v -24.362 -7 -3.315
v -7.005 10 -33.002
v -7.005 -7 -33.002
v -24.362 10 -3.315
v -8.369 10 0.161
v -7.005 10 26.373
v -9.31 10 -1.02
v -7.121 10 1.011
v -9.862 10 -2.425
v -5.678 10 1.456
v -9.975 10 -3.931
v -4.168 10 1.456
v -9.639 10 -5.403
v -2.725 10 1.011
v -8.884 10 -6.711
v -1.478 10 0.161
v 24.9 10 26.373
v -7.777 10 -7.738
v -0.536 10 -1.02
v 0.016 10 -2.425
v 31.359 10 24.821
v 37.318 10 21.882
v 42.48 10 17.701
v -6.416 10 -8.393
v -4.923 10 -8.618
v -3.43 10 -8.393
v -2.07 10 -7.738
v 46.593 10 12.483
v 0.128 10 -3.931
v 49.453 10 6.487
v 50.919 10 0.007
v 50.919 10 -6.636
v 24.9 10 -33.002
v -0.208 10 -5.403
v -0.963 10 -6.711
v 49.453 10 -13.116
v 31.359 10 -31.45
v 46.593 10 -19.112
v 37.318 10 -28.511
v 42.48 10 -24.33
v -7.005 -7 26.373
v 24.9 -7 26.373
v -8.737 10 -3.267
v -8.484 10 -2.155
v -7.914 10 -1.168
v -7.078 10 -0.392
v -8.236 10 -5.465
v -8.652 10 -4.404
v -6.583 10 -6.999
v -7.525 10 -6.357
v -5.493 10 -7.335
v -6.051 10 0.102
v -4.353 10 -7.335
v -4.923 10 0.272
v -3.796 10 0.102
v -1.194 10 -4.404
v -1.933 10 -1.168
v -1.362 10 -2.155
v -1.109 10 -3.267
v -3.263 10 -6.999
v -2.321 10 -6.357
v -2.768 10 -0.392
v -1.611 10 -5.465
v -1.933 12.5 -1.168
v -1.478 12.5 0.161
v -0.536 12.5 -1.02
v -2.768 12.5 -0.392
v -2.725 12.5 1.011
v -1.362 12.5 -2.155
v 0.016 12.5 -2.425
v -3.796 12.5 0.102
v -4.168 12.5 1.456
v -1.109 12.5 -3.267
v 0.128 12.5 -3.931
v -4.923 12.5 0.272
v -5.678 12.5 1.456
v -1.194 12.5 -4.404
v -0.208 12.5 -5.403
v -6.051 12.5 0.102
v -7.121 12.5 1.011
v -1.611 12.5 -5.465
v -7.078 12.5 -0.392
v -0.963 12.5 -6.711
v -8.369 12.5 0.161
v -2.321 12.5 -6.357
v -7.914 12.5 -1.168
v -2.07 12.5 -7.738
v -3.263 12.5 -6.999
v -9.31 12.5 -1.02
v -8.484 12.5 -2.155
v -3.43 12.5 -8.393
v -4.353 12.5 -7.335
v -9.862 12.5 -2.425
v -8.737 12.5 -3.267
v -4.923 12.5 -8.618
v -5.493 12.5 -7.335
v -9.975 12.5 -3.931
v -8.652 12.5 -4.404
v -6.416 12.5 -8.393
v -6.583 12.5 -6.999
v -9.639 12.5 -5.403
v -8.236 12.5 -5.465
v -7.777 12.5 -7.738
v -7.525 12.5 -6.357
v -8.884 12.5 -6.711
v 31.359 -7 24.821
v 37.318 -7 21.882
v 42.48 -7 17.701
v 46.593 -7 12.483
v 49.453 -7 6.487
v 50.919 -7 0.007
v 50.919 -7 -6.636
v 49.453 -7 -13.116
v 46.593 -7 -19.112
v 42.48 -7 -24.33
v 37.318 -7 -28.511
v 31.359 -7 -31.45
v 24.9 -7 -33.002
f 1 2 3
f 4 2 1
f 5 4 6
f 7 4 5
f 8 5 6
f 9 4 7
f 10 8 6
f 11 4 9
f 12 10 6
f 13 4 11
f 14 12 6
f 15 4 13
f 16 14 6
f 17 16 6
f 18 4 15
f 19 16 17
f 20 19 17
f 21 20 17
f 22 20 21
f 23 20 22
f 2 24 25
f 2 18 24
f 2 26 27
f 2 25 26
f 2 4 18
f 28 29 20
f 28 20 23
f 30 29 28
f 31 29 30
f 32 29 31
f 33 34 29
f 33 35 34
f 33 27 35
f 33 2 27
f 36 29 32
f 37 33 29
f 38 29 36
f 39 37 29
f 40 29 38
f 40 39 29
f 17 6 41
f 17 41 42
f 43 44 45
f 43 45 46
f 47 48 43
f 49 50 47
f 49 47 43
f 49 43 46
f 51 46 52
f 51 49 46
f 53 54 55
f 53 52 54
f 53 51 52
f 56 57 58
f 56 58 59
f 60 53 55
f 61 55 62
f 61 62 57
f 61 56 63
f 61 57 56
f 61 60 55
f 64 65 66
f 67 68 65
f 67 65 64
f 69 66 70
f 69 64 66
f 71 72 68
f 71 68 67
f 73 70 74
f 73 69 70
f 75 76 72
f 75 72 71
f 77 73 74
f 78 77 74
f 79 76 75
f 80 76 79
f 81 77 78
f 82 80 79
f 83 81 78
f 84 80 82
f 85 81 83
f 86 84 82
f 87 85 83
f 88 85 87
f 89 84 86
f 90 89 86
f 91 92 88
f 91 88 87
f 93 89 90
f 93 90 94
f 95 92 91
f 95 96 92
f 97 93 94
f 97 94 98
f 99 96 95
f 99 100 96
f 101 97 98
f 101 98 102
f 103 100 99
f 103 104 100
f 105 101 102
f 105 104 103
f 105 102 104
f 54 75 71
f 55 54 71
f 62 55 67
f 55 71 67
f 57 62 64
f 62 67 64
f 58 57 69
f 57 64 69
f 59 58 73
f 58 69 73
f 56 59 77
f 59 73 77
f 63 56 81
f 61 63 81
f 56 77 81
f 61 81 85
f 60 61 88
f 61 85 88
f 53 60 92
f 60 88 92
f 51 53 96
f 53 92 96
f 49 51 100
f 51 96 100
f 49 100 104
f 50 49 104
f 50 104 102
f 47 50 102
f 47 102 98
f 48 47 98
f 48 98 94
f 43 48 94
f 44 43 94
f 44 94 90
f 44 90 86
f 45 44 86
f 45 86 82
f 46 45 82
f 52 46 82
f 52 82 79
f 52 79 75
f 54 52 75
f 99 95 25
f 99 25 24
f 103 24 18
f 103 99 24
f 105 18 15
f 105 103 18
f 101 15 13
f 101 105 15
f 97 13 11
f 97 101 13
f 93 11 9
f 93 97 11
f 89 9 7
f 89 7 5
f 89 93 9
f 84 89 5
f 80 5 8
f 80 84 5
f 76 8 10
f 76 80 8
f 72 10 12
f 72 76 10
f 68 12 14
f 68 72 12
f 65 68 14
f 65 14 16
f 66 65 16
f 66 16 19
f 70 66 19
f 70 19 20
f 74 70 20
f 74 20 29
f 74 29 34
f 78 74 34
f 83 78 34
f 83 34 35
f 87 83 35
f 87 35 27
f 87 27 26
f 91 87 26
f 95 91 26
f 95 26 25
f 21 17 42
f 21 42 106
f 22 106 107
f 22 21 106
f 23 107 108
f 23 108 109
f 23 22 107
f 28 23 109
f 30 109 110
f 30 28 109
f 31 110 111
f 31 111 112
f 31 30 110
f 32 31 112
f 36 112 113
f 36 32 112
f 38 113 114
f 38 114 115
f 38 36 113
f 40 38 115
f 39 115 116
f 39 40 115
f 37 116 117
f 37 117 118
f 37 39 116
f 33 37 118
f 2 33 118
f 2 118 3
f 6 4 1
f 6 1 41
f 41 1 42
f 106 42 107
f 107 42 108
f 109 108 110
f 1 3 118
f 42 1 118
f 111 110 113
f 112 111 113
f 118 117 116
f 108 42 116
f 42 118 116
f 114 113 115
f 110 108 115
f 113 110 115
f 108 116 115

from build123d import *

# Parameters (mm, degrees)
SKETCH2_W            = 49
SKETCH2_H            = 20
BOSS_EXTRUDE1_DEPTH  = 10
SKETCH3_W            = 30
SKETCH3_H            = 3.02
CUT_EXTRUDE1_DEPTH   = 2
SKETCH4_W            = 5
SKETCH4_H            = 6
CUT_EXTRUDE2_DEPTH   = 5
SKETCH5_R            = 7
CUT_EXTRUDE3_DEPTH   = 38.474986727
SKETCH12_W           = 5
SKETCH12_H           = 6
BOSS_EXTRUDE4_DEPTH  = 0.8
SKETCH14_W           = 29.5
SKETCH14_H           = 6
CUT_EXTRUDE6_DEPTH   = 42.177221974
SKETCH20_W           = 5
SKETCH20_H           = 6
BOSS_EXTRUDE6_DEPTH  = 4.2
SKETCH21_R           = 4.6
CUT_EXTRUDE8_DEPTH   = 0.5
SKETCH22_R           = 3.825
CUT_EXTRUDE9_DEPTH   = 4
SKETCH24_R           = 4.6
SKETCH24_R_2         = 4.25
CUT_EXTRUDE11_DEPTH  = 1
BOSS_EXTRUDE9_START  = 8
SKETCH26_R           = 5.065639608
SKETCH26_R_2         = 3.825
BOSS_EXTRUDE9_DEPTH  = 8
SKETCH27_R           = 7
SKETCH27_R_2         = 4.6
CUT_EXTRUDE12_DEPTH  = 1
FILLET1_R            = 0.5
SKETCH56_R           = 2
CUT_EXTRUDE13_DEPTH  = 2
SKETCH57_W           = 3
SKETCH57_H           = 6
BOSS_EXTRUDE19_DEPTH = 5.3
CUT_EXTRUDE14_REACH  = 50.729
SKETCH58_R           = 1.5
FILLET2_R            = 0.3
FILLET3_R            = 0.8
SKETCH60_W           = 19
SKETCH60_H           = 4
BOSS_EXTRUDE21_DEPTH = 1
SKETCH59_W           = 22.86
SKETCH59_H           = 13
BOSS_EXTRUDE20_DEPTH = 11
CUT_EXTRUDE15_REACH  = 49.914
SKETCH61_R           = 2.5
FILLET4_R            = 4
BOSS_EXTRUDE22_DEPTH = 17


with BuildPart() as part:
    # Sketch2 → Boss-Extrude1 (new body)
    with BuildSketch(Plane(origin=(0, 0, 0), x_dir=(1, 0, 0), z_dir=(0, 1, 0))):
        with Locations((10.076923077, 3.557692308)):
            Rectangle(SKETCH2_W, SKETCH2_H)
    extrude(amount=BOSS_EXTRUDE1_DEPTH)

    # Sketch3 → Cut-Extrude1 (cut)
    with BuildSketch(Plane.XZ):
        with Locations((12.576923077, -3.557692308)):
            Rectangle(SKETCH3_W, SKETCH3_H)
    extrude(amount=-CUT_EXTRUDE1_DEPTH, mode=Mode.SUBTRACT)

    # Sketch4 → Cut-Extrude2 (cut)
    with BuildSketch(Plane.XZ):
        with Locations((-4.923076923, -3.547692308)):
            Rectangle(SKETCH4_W, SKETCH4_H)
    extrude(amount=-CUT_EXTRUDE2_DEPTH, mode=Mode.SUBTRACT)

    # Sketch5 → Cut-Extrude3 (cut, through all)
    with BuildSketch(Plane.XZ.offset(-5)):
        with Locations(Location((-4.923076923, -3.552692308, 0), (0, 0, 270))):
            Circle(SKETCH5_R)
    extrude(amount=-CUT_EXTRUDE3_DEPTH, mode=Mode.SUBTRACT)

    # Sketch12 → Boss-Extrude4 (add)
    with BuildSketch(Plane.XZ):
        with Locations((-4.923076923, -3.547692308)):
            Rectangle(SKETCH12_W, SKETCH12_H)
    extrude(amount=-BOSS_EXTRUDE4_DEPTH)

    # Sketch14 → Cut-Extrude6 (cut, through all)
    with BuildSketch(Plane.XY.offset(6.442307692)):
        with Locations((19.826923077, 7)):
            Rectangle(SKETCH14_W, SKETCH14_H)
    extrude(amount=-CUT_EXTRUDE6_DEPTH, mode=Mode.SUBTRACT)

    # Sketch20 → Boss-Extrude6 (add)
    with BuildSketch(Plane(origin=(0, 0.8, 0), x_dir=(1, 0, 0), z_dir=(0, 1, 0))):
        with Locations((-4.923076923, 3.547692308)):
            Rectangle(SKETCH20_W, SKETCH20_H)
    extrude(amount=BOSS_EXTRUDE6_DEPTH)

    # Sketch21 → Cut-Extrude8 (cut)
    with BuildSketch(Plane(origin=(0, 5, 0), x_dir=(1, 0, 0), z_dir=(0, 1, 0))):
        with Locations(Location((-4.923076923, 3.552692308, 0), (0, 0, 270))):
            Circle(SKETCH21_R)
    extrude(amount=-CUT_EXTRUDE8_DEPTH, mode=Mode.SUBTRACT)

    # Sketch22 → Cut-Extrude9 (cut)
    with BuildSketch(Plane(origin=(0, 4.5, 0), x_dir=(1, 0, 0), z_dir=(0, 1, 0))):
        with Locations(Location((-4.923076923, 3.552692308, 0), (0, 0, 270))):
            Circle(SKETCH22_R)
    extrude(amount=-CUT_EXTRUDE9_DEPTH, mode=Mode.SUBTRACT)

    # Sketch24 → Cut-Extrude11 (cut)
    with BuildSketch(Plane(origin=(0, 5, 0), x_dir=(1, 0, 0), z_dir=(0, 1, 0))):
        with Locations(Location((-4.923076923, 3.552692308, 0), (0, 0, 270))):
            Circle(SKETCH24_R)
        with Locations(Location((-4.923076923, 3.552692308, 0), (0, 0, 270))):
            Circle(SKETCH24_R_2, mode=Mode.SUBTRACT)
    extrude(amount=-CUT_EXTRUDE11_DEPTH, mode=Mode.SUBTRACT)

    # Sketch26 → Boss-Extrude9 (add)
    with BuildSketch(Plane(origin=(0, 4.5, 0), x_dir=(1, 0, 0), z_dir=(0, 1, 0)).offset(BOSS_EXTRUDE9_START)):
        with Locations(Location((-4.923076923, 3.552692308, 0), (0, 0, 90))):
            Circle(SKETCH26_R)
        with Locations(Location((-4.923076923, 3.552692308, 0), (0, 0, 270))):
            Circle(SKETCH26_R_2, mode=Mode.SUBTRACT)
    extrude(amount=-BOSS_EXTRUDE9_DEPTH)

    # Sketch27 → Cut-Extrude12 (cut)
    with BuildSketch(Plane(origin=(0, 5, 0), x_dir=(1, 0, 0), z_dir=(0, 1, 0))):
        with Locations(Location((-4.923076923, 3.552692308, 0), (0, 0, 90))):
            Circle(SKETCH27_R)
        with Locations(Location((-4.923076923, 3.552692308, 0), (0, 0, 270))):
            Circle(SKETCH27_R_2, mode=Mode.SUBTRACT)
    extrude(amount=-CUT_EXTRUDE12_DEPTH, mode=Mode.SUBTRACT)

    # Fillet1
    fillet1_edges = [part.edges().sort_by_distance(p)[0] for p in [
        (5.076923077, 4, -3.557692308),
    ]]
    fillet(fillet1_edges, radius=FILLET1_R)

    # Sketch56 → Cut-Extrude13 (cut)
    with BuildSketch(Plane.XZ):
        with Locations((28.926923077, -3.557692308)):
            Circle(SKETCH56_R)
    extrude(amount=-CUT_EXTRUDE13_DEPTH, mode=Mode.SUBTRACT)

    # Sketch57 → Boss-Extrude19 (add)
    with BuildSketch(Plane(origin=(0, 4, 0), x_dir=(1, 0, 0), z_dir=(0, 1, 0))):
        with Locations((29.181923077, 3.557692308)):
            Rectangle(SKETCH57_W, SKETCH57_H)
        with Locations((22.931923077, 3.557692308)):
            Rectangle(SKETCH57_W, SKETCH57_H)
    extrude(amount=BOSS_EXTRUDE19_DEPTH)

    # Cut-Extrude14: up to this face of the body (flat: up to its plane)
    cut_extrude14_end = Plane(part.part.faces().sort_by_distance((21.431923077, 6.65, -3.557692308))[0])
    # Sketch58 → Cut-Extrude14 (cut, up to the picked face)
    with BuildSketch(Plane(origin=(30.681923077, 0, 0), x_dir=(0, 0, -1), z_dir=(1, 0, 0)), mode=Mode.PRIVATE) as cut_extrude14_sk1:
        with Locations(Location((3.557692308, 7, 0), (0, 0, 180))):
            Circle(SKETCH58_R)
    cut_extrude14_tool1 = split(extrude(cut_extrude14_sk1.sketch, amount=-CUT_EXTRUDE14_REACH, mode=Mode.PRIVATE), bisect_by=cut_extrude14_end, keep=Keep.BOTH, mode=Mode.PRIVATE)
    add(cut_extrude14_tool1.solids().sort_by(Axis((30.681923, 7, -3.557692), (-1, 0, 0)))[0], mode=Mode.SUBTRACT)

    # Fillet2
    fillet2_edges = [part.edges().sort_by_distance(p)[0] for p in [
        (27.681923077, 9.3, -3.557692308),
        (24.431923077, 9.3, -3.557692308),
    ]]
    fillet(fillet2_edges, radius=FILLET2_R)

    # Fillet3
    fillet3_edges = [part.edges().sort_by_distance(p)[0] for p in [
        (30.681923077, 4, -3.557692308),
        (30.681923077, 6.65, -0.557692308),
        (29.181923077, 4, -6.557692308),
        (30.681923077, 6.65, -6.557692308),
        (29.181923077, 4, -0.557692308),
        (21.431923077, 6.65, -6.557692308),
        (21.431923077, 6.65, -0.557692308),
        (22.931923077, 4, -6.557692308),
        (21.431923077, 4, -3.557692308),
        (22.931923077, 4, -0.557692308),
    ]]
    fillet(fillet3_edges, radius=FILLET3_R)

    # Sketch60 → Boss-Extrude21 (add)
    with BuildSketch(Plane(origin=(0, 0, -13.557692308), x_dir=(-1, 0, 0), z_dir=(0, 0, -1))):
        with Locations((-25.076923077, 2)):
            Rectangle(SKETCH60_W, SKETCH60_H)
    boss_extrude21 = extrude(amount=BOSS_EXTRUDE21_DEPTH)

    # Sketch59 → Boss-Extrude20 (add)
    with BuildSketch(Plane(origin=(0, 0, -14.557692308), x_dir=(-1, 0, 0), z_dir=(0, 0, -1))):
        with Locations((-26.956923077, 3.5)):
            Rectangle(SKETCH59_W, SKETCH59_H)
    boss_extrude20 = extrude(amount=BOSS_EXTRUDE20_DEPTH)

    # Mirror4: Boss-Extrude21, Boss-Extrude20 across plane
    add(boss_extrude21.mirror(Plane(origin=(0, 0, -3.557692308), x_dir=(1, 0, 0), z_dir=(0, 0, -1))))
    add(boss_extrude20.mirror(Plane(origin=(0, 0, -3.557692308), x_dir=(1, 0, 0), z_dir=(0, 0, -1))))

    # Sketch61 → Cut-Extrude15 (cut, up to next)
    with BuildSketch(Plane(origin=(0, 10, 0), x_dir=(1, 0, 0), z_dir=(0, 1, 0)), mode=Mode.PRIVATE) as cut_extrude15_sk1:
        with Locations(Location((20.406923077, 20.207692308, 0), (0, 0, 270))):
            Circle(SKETCH61_R)
    cut_extrude15_tool1 = extrude(cut_extrude15_sk1.sketch, amount=-CUT_EXTRUDE15_REACH, mode=Mode.PRIVATE) & part.part
    # Sketch61 → Cut-Extrude15 (cut, up to next)
    with BuildSketch(Plane(origin=(0, 10, 0), x_dir=(1, 0, 0), z_dir=(0, 1, 0)), mode=Mode.PRIVATE) as cut_extrude15_sk2:
        with Locations(Location((31.706923077, 20.207692308, 0), (0, 0, 270))):
            Circle(SKETCH61_R)
    cut_extrude15_tool2 = extrude(cut_extrude15_sk2.sketch, amount=-CUT_EXTRUDE15_REACH, mode=Mode.PRIVATE) & part.part
    # Sketch61 → Cut-Extrude15 (cut, up to next)
    with BuildSketch(Plane(origin=(0, 10, 0), x_dir=(1, 0, 0), z_dir=(0, 1, 0)), mode=Mode.PRIVATE) as cut_extrude15_sk3:
        with Locations(Location((31.706923077, -13.092307692, 0), (0, 0, 90))):
            Circle(SKETCH61_R)
    cut_extrude15_tool3 = extrude(cut_extrude15_sk3.sketch, amount=-CUT_EXTRUDE15_REACH, mode=Mode.PRIVATE) & part.part
    # Sketch61 → Cut-Extrude15 (cut, up to next)
    with BuildSketch(Plane(origin=(0, 10, 0), x_dir=(1, 0, 0), z_dir=(0, 1, 0)), mode=Mode.PRIVATE) as cut_extrude15_sk4:
        with Locations(Location((20.406923077, -13.092307692, 0), (0, 0, 90))):
            Circle(SKETCH61_R)
    cut_extrude15_tool4 = extrude(cut_extrude15_sk4.sketch, amount=-CUT_EXTRUDE15_REACH, mode=Mode.PRIVATE) & part.part
    add(cut_extrude15_tool1.solids().sort_by_distance((20.406923, 10, -20.207692))[0], mode=Mode.SUBTRACT)
    add(cut_extrude15_tool2.solids().sort_by_distance((31.706923, 10, -20.207692))[0], mode=Mode.SUBTRACT)
    add(cut_extrude15_tool3.solids().sort_by_distance((31.706923, 10, 13.092308))[0], mode=Mode.SUBTRACT)
    add(cut_extrude15_tool4.solids().sort_by_distance((20.406923, 10, 13.092308))[0], mode=Mode.SUBTRACT)

    # Fillet4
    # the kernel refuses this fillet: 4 mm, written as the material it takes off along each edge
    with BuildSketch(Plane(origin=(38.386923077, 20, -25.557692308), x_dir=(0, 0, 1), z_dir=(0, -1, 0)), Plane(origin=(15.526923077, -13, -25.557692308), x_dir=(0, 0, 1), z_dir=(0, 1, 0)), Plane(origin=(15.526923077, -13, 18.442307692), x_dir=(1, 0, 0), z_dir=(0, 1, 0))) as fillet4_piece_1:
        with BuildLine():
            CenterArc((FILLET4_R, FILLET4_R), FILLET4_R, 180, 90)
            Line((0, FILLET4_R), (0, 0))
            Line((0, 0), (FILLET4_R, 0))
        make_face()
    extrude(amount=33, mode=Mode.SUBTRACT)
    with BuildSketch(Plane(origin=(38.386923077, 20, -14.557692308), x_dir=(-1, 0, 0), z_dir=(0, -1, 0))) as fillet4_piece_2_section:
        with BuildLine():
            CenterArc((FILLET4_R, FILLET4_R), FILLET4_R, 180, 90)
            Line((0, FILLET4_R), (0, 0))
            Line((0, 0), (FILLET4_R, 0))
        make_face()
    fillet4_piece_2 = extrude(amount=33, mode=Mode.PRIVATE)
    fillet4_piece_2 = split(fillet4_piece_2, bisect_by=Plane(origin=(34.576923077, 12, -14.51845576), z_dir=(-1, 0, 0)), keep=Keep.TOP, mode=Mode.PRIVATE)
    fillet4_piece_2 = split(fillet4_piece_2, bisect_by=Plane(origin=(34.482800084, 4, -14.51845576), z_dir=(0, 1, 0)), keep=Keep.TOP, mode=Mode.PRIVATE)
    add(fillet4_piece_2, mode=Mode.SUBTRACT)
    with BuildSketch(Plane(origin=(38.386923077, 20, -14.557692308), x_dir=(-1, 0, 0), z_dir=(0, -1, 0))) as fillet4_piece_3_section:
        with BuildLine():
            CenterArc((FILLET4_R, FILLET4_R), FILLET4_R, 180, 90)
            Line((0, FILLET4_R), (0, 0))
            Line((0, 0), (FILLET4_R, 0))
        make_face()
    fillet4_piece_3 = extrude(amount=33, mode=Mode.PRIVATE)
    fillet4_piece_3 = split(fillet4_piece_3, bisect_by=Plane(origin=(34.576923077, 12, -15.466872512), z_dir=(1, 0, 0)), keep=Keep.TOP, mode=Mode.PRIVATE)
    fillet4_piece_3 = split(fillet4_piece_3, bisect_by=Plane(origin=(37.49276705, 4, -15.466872512), z_dir=(0, 1, 0)), keep=Keep.TOP, mode=Mode.PRIVATE)
    add(fillet4_piece_3, mode=Mode.SUBTRACT)
    with BuildSketch(Plane(origin=(38.386923077, 20, -14.557692308), x_dir=(-1, 0, 0), z_dir=(0, -1, 0))) as fillet4_piece_4_section:
        with BuildLine():
            CenterArc((FILLET4_R, FILLET4_R), FILLET4_R, 180, 90)
            Line((0, FILLET4_R), (0, 0))
            Line((0, 0), (FILLET4_R, 0))
        make_face()
    fillet4_piece_4 = extrude(amount=33, mode=Mode.PRIVATE)
    fillet4_piece_4 = split(fillet4_piece_4, bisect_by=Plane(origin=(34.576923077, 2, -15.466872512), z_dir=(1, 0, 0)), keep=Keep.TOP, mode=Mode.PRIVATE)
    fillet4_piece_4 = split(fillet4_piece_4, bisect_by=Plane(origin=(37.49276705, 0, -15.466872512), z_dir=(0, 1, 0)), keep=Keep.TOP, mode=Mode.PRIVATE)
    fillet4_piece_4 = split(fillet4_piece_4, bisect_by=Plane(origin=(37.49276705, 4, -15.466872512), z_dir=(0, -1, 0)), keep=Keep.TOP, mode=Mode.PRIVATE)
    add(fillet4_piece_4, mode=Mode.SUBTRACT)
    with BuildSketch(Plane(origin=(38.386923077, 20, -14.557692308), x_dir=(-1, 0, 0), z_dir=(0, -1, 0))) as fillet4_piece_5_section:
        with BuildLine():
            CenterArc((FILLET4_R, FILLET4_R), FILLET4_R, 180, 90)
            Line((0, FILLET4_R), (0, 0))
            Line((0, 0), (FILLET4_R, 0))
        make_face()
    fillet4_piece_5 = extrude(amount=33, mode=Mode.PRIVATE)
    fillet4_piece_5 = split(fillet4_piece_5, bisect_by=Plane(origin=(34.576923077, -6.5, -14.51845576), z_dir=(-1, 0, 0)), keep=Keep.TOP, mode=Mode.PRIVATE)
    fillet4_piece_5 = split(fillet4_piece_5, bisect_by=Plane(origin=(34.482800084, 0, -14.51845576), z_dir=(0, -1, 0)), keep=Keep.TOP, mode=Mode.PRIVATE)
    add(fillet4_piece_5, mode=Mode.SUBTRACT)
    with BuildSketch(Plane(origin=(38.386923077, 20, -14.557692308), x_dir=(-1, 0, 0), z_dir=(0, -1, 0))) as fillet4_piece_6_section:
        with BuildLine():
            CenterArc((FILLET4_R, FILLET4_R), FILLET4_R, 180, 90)
            Line((0, FILLET4_R), (0, 0))
            Line((0, 0), (FILLET4_R, 0))
        make_face()
    fillet4_piece_6 = extrude(amount=33, mode=Mode.PRIVATE)
    fillet4_piece_6 = split(fillet4_piece_6, bisect_by=Plane(origin=(34.576923077, -6.5, -15.466872512), z_dir=(1, 0, 0)), keep=Keep.TOP, mode=Mode.PRIVATE)
    fillet4_piece_6 = split(fillet4_piece_6, bisect_by=Plane(origin=(37.49276705, 0, -15.466872512), z_dir=(0, -1, 0)), keep=Keep.TOP, mode=Mode.PRIVATE)
    add(fillet4_piece_6, mode=Mode.SUBTRACT)
    with BuildSketch(Plane(origin=(38.386923077, 20, 7.442307692), x_dir=(0, 0, 1), z_dir=(0, -1, 0))) as fillet4_piece_7_section:
        with BuildLine():
            CenterArc((FILLET4_R, FILLET4_R), FILLET4_R, 180, 90)
            Line((0, FILLET4_R), (0, 0))
            Line((0, 0), (FILLET4_R, 0))
        make_face()
    fillet4_piece_7 = extrude(amount=33, mode=Mode.PRIVATE)
    fillet4_piece_7 = split(fillet4_piece_7, bisect_by=Plane(origin=(34.576923077, 12, 8.351487897), z_dir=(1, 0, 0)), keep=Keep.TOP, mode=Mode.PRIVATE)
    fillet4_piece_7 = split(fillet4_piece_7, bisect_by=Plane(origin=(37.49276705, 4, 8.351487897), z_dir=(0, 1, 0)), keep=Keep.TOP, mode=Mode.PRIVATE)
    add(fillet4_piece_7, mode=Mode.SUBTRACT)
    with BuildSketch(Plane(origin=(38.386923077, 20, 7.442307692), x_dir=(0, 0, 1), z_dir=(0, -1, 0))) as fillet4_piece_8_section:
        with BuildLine():
            CenterArc((FILLET4_R, FILLET4_R), FILLET4_R, 180, 90)
            Line((0, FILLET4_R), (0, 0))
            Line((0, 0), (FILLET4_R, 0))
        make_face()
    fillet4_piece_8 = extrude(amount=33, mode=Mode.PRIVATE)
    fillet4_piece_8 = split(fillet4_piece_8, bisect_by=Plane(origin=(34.576923077, 12, 7.403071145), z_dir=(-1, 0, 0)), keep=Keep.TOP, mode=Mode.PRIVATE)
    fillet4_piece_8 = split(fillet4_piece_8, bisect_by=Plane(origin=(34.482800084, 4, 7.403071145), z_dir=(0, 1, 0)), keep=Keep.TOP, mode=Mode.PRIVATE)
    add(fillet4_piece_8, mode=Mode.SUBTRACT)
    with BuildSketch(Plane(origin=(38.386923077, 20, 7.442307692), x_dir=(0, 0, 1), z_dir=(0, -1, 0))) as fillet4_piece_9_section:
        with BuildLine():
            CenterArc((FILLET4_R, FILLET4_R), FILLET4_R, 180, 90)
            Line((0, FILLET4_R), (0, 0))
            Line((0, 0), (FILLET4_R, 0))
        make_face()
    fillet4_piece_9 = extrude(amount=33, mode=Mode.PRIVATE)
    fillet4_piece_9 = split(fillet4_piece_9, bisect_by=Plane(origin=(34.576923077, 2, 8.351487897), z_dir=(1, 0, 0)), keep=Keep.TOP, mode=Mode.PRIVATE)
    fillet4_piece_9 = split(fillet4_piece_9, bisect_by=Plane(origin=(37.49276705, 0, 8.351487897), z_dir=(0, 1, 0)), keep=Keep.TOP, mode=Mode.PRIVATE)
    fillet4_piece_9 = split(fillet4_piece_9, bisect_by=Plane(origin=(37.49276705, 4, 8.351487897), z_dir=(0, -1, 0)), keep=Keep.TOP, mode=Mode.PRIVATE)
    add(fillet4_piece_9, mode=Mode.SUBTRACT)
    with BuildSketch(Plane(origin=(38.386923077, 20, 7.442307692), x_dir=(0, 0, 1), z_dir=(0, -1, 0))) as fillet4_piece_10_section:
        with BuildLine():
            CenterArc((FILLET4_R, FILLET4_R), FILLET4_R, 180, 90)
            Line((0, FILLET4_R), (0, 0))
            Line((0, 0), (FILLET4_R, 0))
        make_face()
    fillet4_piece_10 = extrude(amount=33, mode=Mode.PRIVATE)
    fillet4_piece_10 = split(fillet4_piece_10, bisect_by=Plane(origin=(34.576923077, -6.5, 8.351487897), z_dir=(1, 0, 0)), keep=Keep.TOP, mode=Mode.PRIVATE)
    fillet4_piece_10 = split(fillet4_piece_10, bisect_by=Plane(origin=(37.49276705, 0, 8.351487897), z_dir=(0, -1, 0)), keep=Keep.TOP, mode=Mode.PRIVATE)
    add(fillet4_piece_10, mode=Mode.SUBTRACT)
    with BuildSketch(Plane(origin=(38.386923077, 20, 7.442307692), x_dir=(0, 0, 1), z_dir=(0, -1, 0))) as fillet4_piece_11_section:
        with BuildLine():
            CenterArc((FILLET4_R, FILLET4_R), FILLET4_R, 180, 90)
            Line((0, FILLET4_R), (0, 0))
            Line((0, 0), (FILLET4_R, 0))
        make_face()
    fillet4_piece_11 = extrude(amount=33, mode=Mode.PRIVATE)
    fillet4_piece_11 = split(fillet4_piece_11, bisect_by=Plane(origin=(34.576923077, -6.5, 7.403071145), z_dir=(-1, 0, 0)), keep=Keep.TOP, mode=Mode.PRIVATE)
    fillet4_piece_11 = split(fillet4_piece_11, bisect_by=Plane(origin=(34.482800084, 0, 7.403071145), z_dir=(0, -1, 0)), keep=Keep.TOP, mode=Mode.PRIVATE)
    add(fillet4_piece_11, mode=Mode.SUBTRACT)
    with BuildSketch(Plane(origin=(38.386923077, 20, 18.442307692), x_dir=(0, 0, -1), z_dir=(0, -1, 0))) as fillet4_piece_12:
        with BuildLine():
            CenterArc((FILLET4_R, -FILLET4_R), FILLET4_R, 90, 90)
            Line((0, -FILLET4_R), (0, 0))
            Line((0, 0), (FILLET4_R, 0))
        make_face()
    extrude(amount=33, mode=Mode.SUBTRACT)
    with BuildSketch(Plane(origin=(-14.423076923, -10, 6.442307692), x_dir=(1, 0, 0), z_dir=(0, 1, 0))) as fillet4_piece_13:
        with BuildLine():
            CenterArc((FILLET4_R, FILLET4_R), FILLET4_R, 180, 90)
            Line((0, FILLET4_R), (0, 0))
            Line((0, 0), (FILLET4_R, 0))
        make_face()
    extrude(amount=30, mode=Mode.SUBTRACT)
    with BuildSketch(Plane(origin=(-14.423076923, -10, -13.557692308), x_dir=(1, 0, 0), z_dir=(0, 1, 0))) as fillet4_piece_14:
        with BuildLine():
            CenterArc((FILLET4_R, -FILLET4_R), FILLET4_R, 90, 90)
            Line((0, -FILLET4_R), (0, 0))
            Line((0, 0), (FILLET4_R, 0))
        make_face()
    extrude(amount=30, mode=Mode.SUBTRACT)

    # Sketch62 → Boss-Extrude22 (add)
    with BuildSketch(Plane(origin=(0, 10, 0), x_dir=(1, 0, 0), z_dir=(0, 1, 0))):
        with BuildLine():
            Line((-24.361726951, 3.314545782), (-7.005211005, -26.372589568))
            Line((-7.005211005, -26.372589568), (24.899678694, -26.372589568))
            ThreePointArc((24.899678694, -26.372589568), (51.103814887, 3.314545782), (24.899678694, 33.001681131))
            Line((24.899678694, 33.001681131), (-7.005211005, 33.001681131))
            Line((-7.005211005, 33.001681131), (-24.361726951, 3.314545782))
        make_face()
    extrude(amount=-BOSS_EXTRUDE22_DEPTH)


solid = part.part
